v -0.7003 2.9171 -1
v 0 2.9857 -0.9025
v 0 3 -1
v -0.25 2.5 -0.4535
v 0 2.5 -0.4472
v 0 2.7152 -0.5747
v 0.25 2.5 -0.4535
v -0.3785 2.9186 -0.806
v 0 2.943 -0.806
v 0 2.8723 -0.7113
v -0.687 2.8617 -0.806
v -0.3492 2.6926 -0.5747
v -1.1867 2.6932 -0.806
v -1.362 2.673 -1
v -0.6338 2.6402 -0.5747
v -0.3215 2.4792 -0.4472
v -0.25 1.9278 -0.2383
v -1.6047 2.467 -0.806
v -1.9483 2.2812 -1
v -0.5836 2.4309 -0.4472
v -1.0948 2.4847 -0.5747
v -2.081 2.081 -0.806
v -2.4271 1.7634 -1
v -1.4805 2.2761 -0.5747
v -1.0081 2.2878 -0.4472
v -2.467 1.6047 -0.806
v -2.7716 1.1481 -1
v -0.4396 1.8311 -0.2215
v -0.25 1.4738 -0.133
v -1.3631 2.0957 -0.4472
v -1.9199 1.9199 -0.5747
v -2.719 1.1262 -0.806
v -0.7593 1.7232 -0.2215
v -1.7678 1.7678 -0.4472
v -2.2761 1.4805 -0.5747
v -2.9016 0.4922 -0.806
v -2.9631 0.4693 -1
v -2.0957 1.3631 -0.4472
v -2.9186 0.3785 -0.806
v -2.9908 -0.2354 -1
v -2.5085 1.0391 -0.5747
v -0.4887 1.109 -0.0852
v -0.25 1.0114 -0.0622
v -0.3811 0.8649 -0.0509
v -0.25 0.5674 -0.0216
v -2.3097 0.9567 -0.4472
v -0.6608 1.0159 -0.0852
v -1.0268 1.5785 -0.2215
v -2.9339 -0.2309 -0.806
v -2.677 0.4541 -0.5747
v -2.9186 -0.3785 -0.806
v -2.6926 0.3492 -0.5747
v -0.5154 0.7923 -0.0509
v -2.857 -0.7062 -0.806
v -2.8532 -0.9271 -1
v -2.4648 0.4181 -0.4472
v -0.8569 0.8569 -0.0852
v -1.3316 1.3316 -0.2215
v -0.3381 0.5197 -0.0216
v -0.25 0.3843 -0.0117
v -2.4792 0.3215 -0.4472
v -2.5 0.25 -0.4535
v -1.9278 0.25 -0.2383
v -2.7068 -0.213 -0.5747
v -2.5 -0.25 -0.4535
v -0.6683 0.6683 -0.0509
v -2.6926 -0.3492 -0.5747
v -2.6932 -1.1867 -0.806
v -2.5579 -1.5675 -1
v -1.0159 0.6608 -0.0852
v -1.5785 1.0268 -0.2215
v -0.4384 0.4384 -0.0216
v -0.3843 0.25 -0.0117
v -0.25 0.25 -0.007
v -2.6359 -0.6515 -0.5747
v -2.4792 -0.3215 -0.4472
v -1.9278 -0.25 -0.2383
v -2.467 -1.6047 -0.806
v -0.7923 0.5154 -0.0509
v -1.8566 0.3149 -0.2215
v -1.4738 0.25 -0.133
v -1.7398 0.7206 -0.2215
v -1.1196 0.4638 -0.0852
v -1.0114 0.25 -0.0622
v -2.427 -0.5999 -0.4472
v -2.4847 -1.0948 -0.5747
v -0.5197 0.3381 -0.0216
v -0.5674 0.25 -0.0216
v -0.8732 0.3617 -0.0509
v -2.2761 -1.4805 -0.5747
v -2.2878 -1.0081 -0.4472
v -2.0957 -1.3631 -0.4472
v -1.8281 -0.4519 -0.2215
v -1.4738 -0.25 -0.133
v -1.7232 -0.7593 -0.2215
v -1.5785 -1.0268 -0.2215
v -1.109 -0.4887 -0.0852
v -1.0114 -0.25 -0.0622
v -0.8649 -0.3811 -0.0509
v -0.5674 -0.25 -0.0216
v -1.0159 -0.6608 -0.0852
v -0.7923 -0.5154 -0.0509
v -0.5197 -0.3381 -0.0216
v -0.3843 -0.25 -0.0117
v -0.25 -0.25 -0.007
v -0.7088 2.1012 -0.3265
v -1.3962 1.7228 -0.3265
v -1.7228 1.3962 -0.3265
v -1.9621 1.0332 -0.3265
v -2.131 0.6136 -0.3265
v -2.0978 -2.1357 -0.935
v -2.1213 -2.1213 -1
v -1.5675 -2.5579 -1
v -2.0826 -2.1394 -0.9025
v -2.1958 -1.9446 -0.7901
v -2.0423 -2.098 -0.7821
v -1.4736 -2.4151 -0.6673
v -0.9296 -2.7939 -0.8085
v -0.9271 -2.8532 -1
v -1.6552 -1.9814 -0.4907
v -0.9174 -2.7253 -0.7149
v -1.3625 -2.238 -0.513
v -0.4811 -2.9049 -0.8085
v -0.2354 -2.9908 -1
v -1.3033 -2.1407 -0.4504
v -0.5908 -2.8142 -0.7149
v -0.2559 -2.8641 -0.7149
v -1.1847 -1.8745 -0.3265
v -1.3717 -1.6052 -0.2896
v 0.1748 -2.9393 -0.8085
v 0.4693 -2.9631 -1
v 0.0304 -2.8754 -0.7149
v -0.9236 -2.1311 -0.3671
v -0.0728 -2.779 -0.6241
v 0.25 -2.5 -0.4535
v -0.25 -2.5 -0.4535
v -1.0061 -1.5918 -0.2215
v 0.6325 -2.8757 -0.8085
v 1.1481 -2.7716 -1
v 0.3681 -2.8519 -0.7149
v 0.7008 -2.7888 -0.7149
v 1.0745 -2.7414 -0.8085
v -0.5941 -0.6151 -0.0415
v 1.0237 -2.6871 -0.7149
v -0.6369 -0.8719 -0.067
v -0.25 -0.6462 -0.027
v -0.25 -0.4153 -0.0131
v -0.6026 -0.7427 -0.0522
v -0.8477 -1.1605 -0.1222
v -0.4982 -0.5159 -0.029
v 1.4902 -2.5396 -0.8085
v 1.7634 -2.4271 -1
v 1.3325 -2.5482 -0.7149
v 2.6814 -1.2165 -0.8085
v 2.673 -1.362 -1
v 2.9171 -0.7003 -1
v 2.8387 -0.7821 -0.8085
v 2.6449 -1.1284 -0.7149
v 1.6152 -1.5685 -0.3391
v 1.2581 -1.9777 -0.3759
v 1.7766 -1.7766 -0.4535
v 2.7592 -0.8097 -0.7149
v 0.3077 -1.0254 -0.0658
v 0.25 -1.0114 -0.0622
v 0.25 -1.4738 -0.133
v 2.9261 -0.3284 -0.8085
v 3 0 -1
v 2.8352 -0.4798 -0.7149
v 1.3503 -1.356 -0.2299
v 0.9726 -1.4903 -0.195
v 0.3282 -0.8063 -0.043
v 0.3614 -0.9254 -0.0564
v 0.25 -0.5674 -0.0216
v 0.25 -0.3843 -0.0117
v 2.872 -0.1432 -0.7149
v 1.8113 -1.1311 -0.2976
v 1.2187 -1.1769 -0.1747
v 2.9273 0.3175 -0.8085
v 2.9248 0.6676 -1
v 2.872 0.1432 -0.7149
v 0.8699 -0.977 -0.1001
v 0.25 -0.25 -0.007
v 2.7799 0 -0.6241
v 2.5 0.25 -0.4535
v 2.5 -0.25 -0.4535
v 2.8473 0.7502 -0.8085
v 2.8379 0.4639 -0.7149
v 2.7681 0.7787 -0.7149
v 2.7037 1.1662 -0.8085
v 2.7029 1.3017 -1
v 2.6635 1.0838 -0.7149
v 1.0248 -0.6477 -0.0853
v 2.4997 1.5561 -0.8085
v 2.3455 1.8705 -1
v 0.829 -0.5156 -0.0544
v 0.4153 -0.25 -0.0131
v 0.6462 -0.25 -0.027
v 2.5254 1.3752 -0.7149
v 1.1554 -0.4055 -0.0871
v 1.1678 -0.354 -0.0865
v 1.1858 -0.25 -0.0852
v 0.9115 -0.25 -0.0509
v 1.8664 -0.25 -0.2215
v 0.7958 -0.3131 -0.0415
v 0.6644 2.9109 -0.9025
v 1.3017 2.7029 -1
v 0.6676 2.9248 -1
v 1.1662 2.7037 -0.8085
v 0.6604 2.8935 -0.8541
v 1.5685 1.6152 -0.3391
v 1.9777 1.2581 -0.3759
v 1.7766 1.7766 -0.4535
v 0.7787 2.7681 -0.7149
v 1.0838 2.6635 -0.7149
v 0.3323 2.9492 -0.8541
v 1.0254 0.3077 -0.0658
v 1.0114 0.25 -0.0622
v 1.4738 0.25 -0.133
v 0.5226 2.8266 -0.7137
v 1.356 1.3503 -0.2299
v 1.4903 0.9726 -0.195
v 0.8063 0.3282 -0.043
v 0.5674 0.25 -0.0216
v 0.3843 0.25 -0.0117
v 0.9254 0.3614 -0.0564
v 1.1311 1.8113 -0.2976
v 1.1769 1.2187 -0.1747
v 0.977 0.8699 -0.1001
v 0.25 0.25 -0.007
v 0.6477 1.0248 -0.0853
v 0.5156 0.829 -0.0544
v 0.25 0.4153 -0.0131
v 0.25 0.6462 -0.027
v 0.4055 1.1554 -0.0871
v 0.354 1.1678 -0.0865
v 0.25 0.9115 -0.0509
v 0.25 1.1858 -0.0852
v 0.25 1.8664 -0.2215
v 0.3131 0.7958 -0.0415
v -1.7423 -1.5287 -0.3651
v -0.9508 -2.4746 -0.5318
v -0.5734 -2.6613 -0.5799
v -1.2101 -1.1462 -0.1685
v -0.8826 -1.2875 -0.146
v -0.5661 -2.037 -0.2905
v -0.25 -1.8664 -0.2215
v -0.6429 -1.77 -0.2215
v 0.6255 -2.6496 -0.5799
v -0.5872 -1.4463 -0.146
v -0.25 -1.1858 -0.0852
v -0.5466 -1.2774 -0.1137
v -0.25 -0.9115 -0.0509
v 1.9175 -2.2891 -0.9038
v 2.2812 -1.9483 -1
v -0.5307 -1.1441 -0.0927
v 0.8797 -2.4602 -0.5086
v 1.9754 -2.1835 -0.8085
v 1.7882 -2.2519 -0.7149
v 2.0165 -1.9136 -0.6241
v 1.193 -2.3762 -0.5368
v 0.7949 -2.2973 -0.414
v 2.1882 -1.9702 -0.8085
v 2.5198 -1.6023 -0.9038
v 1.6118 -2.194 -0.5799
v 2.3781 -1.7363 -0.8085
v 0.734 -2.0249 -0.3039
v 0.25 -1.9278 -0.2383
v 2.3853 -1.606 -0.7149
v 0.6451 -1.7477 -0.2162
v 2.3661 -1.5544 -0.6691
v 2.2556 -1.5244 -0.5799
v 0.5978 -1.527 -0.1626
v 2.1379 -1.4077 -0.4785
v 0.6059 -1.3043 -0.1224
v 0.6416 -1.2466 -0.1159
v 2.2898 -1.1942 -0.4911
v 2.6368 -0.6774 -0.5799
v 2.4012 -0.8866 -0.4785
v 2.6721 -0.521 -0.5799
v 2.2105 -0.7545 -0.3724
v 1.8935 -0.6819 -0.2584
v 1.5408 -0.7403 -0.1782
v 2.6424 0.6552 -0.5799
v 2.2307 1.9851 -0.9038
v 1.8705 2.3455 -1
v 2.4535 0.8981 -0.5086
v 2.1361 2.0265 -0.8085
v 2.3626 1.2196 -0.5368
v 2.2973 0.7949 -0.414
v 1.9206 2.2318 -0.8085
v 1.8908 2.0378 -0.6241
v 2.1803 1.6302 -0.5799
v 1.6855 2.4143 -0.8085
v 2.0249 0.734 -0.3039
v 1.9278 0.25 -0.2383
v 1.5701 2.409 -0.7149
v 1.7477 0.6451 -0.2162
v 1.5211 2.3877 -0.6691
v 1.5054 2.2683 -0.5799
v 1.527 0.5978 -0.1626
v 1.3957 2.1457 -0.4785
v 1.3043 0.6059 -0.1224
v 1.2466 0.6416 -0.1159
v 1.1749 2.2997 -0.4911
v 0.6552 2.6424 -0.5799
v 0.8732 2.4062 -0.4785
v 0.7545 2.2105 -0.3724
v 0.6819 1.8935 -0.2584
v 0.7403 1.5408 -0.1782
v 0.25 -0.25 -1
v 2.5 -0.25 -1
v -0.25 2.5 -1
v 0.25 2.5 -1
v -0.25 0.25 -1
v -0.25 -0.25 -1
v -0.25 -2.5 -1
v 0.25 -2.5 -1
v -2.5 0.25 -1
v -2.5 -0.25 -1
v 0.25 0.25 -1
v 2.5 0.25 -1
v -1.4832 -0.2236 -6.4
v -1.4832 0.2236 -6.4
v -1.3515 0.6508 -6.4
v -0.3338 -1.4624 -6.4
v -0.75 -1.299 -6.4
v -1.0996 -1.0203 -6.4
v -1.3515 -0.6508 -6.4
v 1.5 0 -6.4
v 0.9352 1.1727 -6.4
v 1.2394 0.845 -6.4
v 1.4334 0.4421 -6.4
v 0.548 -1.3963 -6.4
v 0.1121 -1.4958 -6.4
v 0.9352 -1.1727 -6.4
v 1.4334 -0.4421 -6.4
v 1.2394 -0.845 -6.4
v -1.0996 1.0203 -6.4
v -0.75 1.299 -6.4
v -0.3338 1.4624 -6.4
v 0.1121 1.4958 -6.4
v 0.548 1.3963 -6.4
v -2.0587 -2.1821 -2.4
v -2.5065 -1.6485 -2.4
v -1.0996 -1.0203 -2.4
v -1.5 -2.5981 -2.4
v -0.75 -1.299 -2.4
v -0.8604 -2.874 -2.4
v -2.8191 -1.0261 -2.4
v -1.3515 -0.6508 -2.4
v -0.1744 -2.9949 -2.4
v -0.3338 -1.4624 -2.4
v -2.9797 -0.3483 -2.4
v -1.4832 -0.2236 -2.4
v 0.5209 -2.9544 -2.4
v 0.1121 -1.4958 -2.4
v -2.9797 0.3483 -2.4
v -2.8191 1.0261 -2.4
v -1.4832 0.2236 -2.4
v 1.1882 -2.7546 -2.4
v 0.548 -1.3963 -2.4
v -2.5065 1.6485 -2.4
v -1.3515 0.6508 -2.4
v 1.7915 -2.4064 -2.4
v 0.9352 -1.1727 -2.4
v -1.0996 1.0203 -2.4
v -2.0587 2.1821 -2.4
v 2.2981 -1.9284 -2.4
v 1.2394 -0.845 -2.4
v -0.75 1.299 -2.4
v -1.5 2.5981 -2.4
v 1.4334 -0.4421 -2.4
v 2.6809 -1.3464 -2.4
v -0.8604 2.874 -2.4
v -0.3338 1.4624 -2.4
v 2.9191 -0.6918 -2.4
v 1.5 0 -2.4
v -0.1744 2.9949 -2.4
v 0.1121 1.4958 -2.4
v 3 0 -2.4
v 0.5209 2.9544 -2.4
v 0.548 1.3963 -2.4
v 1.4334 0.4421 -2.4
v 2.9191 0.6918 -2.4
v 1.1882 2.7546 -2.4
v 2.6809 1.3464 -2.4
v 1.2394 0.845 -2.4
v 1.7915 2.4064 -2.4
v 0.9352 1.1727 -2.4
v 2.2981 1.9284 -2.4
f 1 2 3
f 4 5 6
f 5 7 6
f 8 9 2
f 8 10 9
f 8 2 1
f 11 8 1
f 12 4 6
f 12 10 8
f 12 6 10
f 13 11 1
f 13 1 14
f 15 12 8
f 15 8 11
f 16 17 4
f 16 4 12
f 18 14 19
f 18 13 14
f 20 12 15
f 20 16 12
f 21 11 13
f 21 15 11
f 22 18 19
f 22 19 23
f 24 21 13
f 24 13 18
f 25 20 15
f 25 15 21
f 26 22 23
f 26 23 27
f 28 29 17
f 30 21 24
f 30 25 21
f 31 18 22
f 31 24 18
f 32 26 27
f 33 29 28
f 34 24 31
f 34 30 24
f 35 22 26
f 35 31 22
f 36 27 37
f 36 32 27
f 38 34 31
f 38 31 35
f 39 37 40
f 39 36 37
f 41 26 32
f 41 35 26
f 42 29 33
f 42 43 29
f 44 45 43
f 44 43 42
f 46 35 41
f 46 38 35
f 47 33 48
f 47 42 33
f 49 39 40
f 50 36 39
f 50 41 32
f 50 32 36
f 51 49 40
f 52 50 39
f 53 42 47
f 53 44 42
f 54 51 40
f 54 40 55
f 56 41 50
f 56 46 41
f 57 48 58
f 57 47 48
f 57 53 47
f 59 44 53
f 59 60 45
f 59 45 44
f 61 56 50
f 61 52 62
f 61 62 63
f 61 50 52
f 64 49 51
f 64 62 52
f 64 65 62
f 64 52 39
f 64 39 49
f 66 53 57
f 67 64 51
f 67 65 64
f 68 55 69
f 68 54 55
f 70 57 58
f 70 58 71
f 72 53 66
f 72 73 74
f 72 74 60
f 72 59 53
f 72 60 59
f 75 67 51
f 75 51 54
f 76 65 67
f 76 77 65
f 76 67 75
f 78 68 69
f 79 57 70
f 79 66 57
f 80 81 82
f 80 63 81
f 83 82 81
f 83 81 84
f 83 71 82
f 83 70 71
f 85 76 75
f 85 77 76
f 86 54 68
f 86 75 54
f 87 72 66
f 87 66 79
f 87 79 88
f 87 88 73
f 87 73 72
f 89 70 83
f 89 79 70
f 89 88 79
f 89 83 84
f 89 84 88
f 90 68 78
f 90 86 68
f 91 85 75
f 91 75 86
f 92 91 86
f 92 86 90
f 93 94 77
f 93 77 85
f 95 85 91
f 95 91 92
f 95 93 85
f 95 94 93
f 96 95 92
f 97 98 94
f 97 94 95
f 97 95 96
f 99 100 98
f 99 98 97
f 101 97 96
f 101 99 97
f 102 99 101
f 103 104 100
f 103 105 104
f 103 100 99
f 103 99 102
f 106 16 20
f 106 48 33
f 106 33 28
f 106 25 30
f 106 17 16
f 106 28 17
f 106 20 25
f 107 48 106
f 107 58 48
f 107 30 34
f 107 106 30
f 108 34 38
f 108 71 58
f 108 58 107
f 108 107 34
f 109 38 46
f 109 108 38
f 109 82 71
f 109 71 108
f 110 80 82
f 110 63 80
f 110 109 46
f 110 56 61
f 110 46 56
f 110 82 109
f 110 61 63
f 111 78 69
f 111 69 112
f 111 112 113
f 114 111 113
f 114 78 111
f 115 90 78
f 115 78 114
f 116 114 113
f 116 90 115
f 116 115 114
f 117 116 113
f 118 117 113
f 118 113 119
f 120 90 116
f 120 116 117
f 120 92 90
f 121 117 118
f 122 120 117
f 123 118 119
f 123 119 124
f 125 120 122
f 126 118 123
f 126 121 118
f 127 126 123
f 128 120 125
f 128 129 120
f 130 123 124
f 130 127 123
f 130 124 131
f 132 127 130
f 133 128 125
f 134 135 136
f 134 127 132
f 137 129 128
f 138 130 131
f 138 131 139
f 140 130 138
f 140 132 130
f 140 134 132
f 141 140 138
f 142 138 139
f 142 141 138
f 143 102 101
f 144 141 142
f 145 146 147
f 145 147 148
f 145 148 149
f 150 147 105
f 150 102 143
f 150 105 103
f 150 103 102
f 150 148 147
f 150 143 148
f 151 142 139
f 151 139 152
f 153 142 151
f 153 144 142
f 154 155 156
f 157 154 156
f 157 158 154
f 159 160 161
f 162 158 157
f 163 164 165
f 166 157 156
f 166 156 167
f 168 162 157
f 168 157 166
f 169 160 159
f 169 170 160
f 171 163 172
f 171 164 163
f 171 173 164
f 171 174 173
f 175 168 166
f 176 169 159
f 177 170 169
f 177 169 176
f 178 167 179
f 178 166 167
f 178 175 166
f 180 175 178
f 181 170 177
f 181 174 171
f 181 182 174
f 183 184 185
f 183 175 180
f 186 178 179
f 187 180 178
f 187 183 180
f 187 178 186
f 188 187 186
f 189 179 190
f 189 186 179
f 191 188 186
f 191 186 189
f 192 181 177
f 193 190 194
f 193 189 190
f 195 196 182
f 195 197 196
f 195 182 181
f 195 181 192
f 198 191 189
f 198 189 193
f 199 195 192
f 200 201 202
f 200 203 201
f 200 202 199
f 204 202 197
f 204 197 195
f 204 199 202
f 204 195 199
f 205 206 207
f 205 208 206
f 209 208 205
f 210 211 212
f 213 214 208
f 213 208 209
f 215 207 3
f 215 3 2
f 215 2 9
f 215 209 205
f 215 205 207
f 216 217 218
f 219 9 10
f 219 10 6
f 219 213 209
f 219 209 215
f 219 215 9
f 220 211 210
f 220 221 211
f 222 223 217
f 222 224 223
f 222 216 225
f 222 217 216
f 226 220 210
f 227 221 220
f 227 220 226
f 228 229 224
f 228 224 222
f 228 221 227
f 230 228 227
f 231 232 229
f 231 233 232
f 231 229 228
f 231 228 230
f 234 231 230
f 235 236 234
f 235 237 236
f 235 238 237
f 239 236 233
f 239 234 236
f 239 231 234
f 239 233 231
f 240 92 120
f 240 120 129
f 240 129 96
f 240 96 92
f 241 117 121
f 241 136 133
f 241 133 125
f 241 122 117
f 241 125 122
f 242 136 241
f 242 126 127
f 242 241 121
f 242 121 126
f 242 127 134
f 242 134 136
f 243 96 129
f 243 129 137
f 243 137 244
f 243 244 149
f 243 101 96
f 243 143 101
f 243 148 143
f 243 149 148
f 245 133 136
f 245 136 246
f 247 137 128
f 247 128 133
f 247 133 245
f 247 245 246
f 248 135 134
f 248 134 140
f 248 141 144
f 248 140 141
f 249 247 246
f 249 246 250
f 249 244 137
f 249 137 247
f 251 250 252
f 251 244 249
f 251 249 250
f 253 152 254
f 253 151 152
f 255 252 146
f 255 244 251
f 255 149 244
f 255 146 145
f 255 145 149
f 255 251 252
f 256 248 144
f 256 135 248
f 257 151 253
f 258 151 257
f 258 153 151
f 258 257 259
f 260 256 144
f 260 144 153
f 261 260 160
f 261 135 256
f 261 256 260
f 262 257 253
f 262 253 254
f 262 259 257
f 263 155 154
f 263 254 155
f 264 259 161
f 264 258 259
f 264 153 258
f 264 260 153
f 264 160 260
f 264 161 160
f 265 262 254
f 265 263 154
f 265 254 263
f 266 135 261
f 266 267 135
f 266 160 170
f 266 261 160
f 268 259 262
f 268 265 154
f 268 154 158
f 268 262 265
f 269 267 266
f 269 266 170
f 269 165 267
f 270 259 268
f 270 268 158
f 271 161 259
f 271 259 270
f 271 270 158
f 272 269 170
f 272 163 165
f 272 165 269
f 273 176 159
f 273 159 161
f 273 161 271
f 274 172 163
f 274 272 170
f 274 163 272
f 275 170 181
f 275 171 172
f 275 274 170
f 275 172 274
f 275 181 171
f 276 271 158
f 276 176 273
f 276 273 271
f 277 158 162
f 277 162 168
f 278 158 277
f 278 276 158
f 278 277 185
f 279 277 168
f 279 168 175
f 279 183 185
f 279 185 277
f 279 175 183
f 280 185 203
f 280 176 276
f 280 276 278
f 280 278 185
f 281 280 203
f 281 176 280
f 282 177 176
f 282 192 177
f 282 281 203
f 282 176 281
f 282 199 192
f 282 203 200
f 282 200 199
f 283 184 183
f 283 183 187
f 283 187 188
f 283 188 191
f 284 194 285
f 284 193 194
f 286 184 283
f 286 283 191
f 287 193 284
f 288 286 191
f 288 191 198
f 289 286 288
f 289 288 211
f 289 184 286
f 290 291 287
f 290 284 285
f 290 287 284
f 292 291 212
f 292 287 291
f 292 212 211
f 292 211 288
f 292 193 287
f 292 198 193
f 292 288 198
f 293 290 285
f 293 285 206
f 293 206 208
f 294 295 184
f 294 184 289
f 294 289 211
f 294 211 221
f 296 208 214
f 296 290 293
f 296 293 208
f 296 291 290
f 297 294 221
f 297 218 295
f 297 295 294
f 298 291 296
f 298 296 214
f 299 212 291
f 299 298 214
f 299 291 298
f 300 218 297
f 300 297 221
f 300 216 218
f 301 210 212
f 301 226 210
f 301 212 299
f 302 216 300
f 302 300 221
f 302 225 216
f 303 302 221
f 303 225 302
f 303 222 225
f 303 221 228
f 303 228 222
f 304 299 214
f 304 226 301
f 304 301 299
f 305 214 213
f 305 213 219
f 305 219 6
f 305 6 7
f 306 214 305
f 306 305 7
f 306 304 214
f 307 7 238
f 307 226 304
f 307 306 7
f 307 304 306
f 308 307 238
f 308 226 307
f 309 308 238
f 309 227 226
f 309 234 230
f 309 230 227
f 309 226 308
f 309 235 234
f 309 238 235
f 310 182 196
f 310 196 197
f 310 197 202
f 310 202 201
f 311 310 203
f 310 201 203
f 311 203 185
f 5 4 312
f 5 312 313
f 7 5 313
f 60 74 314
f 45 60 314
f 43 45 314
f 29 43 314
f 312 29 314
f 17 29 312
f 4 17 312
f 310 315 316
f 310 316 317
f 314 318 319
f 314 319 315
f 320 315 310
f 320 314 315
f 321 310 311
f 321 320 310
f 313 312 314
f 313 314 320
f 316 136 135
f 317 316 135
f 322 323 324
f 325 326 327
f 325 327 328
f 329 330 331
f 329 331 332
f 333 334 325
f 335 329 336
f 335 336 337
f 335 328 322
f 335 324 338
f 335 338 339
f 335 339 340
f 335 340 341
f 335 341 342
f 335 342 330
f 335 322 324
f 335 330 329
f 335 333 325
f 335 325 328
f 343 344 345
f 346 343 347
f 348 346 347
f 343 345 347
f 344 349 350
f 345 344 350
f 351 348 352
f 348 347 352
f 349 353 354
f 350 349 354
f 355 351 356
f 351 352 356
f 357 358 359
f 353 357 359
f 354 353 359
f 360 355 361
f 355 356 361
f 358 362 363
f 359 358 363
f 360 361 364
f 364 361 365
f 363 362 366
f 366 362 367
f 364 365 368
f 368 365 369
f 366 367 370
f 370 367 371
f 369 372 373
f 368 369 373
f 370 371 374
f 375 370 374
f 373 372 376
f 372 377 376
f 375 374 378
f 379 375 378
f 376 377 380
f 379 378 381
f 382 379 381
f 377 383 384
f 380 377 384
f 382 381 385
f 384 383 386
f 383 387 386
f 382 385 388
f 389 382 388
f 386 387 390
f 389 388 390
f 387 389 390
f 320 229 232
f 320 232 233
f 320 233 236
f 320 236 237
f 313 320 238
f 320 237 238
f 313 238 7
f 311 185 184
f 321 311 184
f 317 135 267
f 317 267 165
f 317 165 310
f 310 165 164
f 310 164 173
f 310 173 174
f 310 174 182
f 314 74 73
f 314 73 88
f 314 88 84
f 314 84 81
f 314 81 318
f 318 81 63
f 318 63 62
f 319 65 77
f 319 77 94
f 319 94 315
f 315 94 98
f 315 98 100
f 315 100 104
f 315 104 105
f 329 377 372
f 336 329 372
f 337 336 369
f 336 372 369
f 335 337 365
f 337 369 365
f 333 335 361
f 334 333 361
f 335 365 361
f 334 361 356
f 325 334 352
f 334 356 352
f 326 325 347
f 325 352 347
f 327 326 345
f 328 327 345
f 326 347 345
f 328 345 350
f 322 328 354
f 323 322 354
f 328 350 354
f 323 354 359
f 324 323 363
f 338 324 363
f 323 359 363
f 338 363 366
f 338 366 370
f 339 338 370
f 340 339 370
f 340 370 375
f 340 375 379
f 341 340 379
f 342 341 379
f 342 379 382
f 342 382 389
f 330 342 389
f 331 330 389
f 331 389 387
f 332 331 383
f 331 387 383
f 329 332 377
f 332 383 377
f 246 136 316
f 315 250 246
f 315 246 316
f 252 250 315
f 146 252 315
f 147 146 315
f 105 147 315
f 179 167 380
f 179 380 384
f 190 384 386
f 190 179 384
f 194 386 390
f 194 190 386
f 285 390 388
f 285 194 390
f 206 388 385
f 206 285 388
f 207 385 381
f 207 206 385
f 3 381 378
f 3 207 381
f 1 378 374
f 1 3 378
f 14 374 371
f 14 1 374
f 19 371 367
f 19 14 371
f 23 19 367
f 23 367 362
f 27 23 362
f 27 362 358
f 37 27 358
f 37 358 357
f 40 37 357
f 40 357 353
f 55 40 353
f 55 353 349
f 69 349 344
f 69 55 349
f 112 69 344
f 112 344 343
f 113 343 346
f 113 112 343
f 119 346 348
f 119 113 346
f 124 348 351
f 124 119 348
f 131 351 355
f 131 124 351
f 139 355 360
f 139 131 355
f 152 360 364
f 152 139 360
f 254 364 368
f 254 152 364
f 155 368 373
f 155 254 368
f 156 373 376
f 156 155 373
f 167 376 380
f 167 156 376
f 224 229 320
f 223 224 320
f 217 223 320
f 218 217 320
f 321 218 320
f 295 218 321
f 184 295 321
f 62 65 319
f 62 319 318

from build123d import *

# Parameters (mm, degrees)
BOSS_EXTRUDE3_START = -1
SKETCH1_R           = 3
BOSS_EXTRUDE3_DEPTH = 1.4
DOME1_FACE_RADIUS   = 3
DOME1_HEIGHT        = 1
SKETCH4_R           = 1.5
BOSS_EXTRUDE4_DEPTH = 4
CUT_EXTRUDE1_DEPTH  = 1


with BuildPart() as part:
    # Sketch1 → Boss-Extrude3 (new body)
    with BuildSketch(Plane.XY.offset(BOSS_EXTRUDE3_START)):
        Circle(SKETCH1_R)
    extrude(amount=-BOSS_EXTRUDE3_DEPTH)

    # Dome1: an elliptical dome of height H over a round flat face of radius A is half a spheroid: the quarter ellipse of half axes A and H revolved about the face's axis
    with BuildSketch(Plane((0, 0, -1), x_dir=(0, 1, 0), z_dir=(1, 0, 0)), mode=Mode.PRIVATE) as dome1_quarter:
        Ellipse(DOME1_FACE_RADIUS, DOME1_HEIGHT)
        Rectangle(DOME1_FACE_RADIUS, DOME1_HEIGHT, align=(Align.MIN, Align.MIN), mode=Mode.INTERSECT)
    revolve(dome1_quarter.sketch, axis=Axis((0, 0, -1), (0, 0, 1)))

    # Sketch4 → Boss-Extrude4 (add)
    with BuildSketch(Plane(origin=(0, 0, -2.4), x_dir=(-1, 0, 0), z_dir=(0, 0, -1))):
        Circle(SKETCH4_R)
    extrude(amount=BOSS_EXTRUDE4_DEPTH)

    # Sketch5 → Cut-Extrude1 (cut)
    with BuildSketch(Plane.XY):
        Polygon((0.25, 2.5), (-0.25, 2.5), (-0.25, 0.25), (-2.5, 0.25), (-2.5, -0.25), (-0.25, -0.25), (-0.25, -2.5), (0.25, -2.5), (0.25, -0.25), (2.5, -0.25), (2.5, 0.25), (0.25, 0.25), align=None)
    extrude(amount=-CUT_EXTRUDE1_DEPTH, mode=Mode.SUBTRACT)


solid = part.part
